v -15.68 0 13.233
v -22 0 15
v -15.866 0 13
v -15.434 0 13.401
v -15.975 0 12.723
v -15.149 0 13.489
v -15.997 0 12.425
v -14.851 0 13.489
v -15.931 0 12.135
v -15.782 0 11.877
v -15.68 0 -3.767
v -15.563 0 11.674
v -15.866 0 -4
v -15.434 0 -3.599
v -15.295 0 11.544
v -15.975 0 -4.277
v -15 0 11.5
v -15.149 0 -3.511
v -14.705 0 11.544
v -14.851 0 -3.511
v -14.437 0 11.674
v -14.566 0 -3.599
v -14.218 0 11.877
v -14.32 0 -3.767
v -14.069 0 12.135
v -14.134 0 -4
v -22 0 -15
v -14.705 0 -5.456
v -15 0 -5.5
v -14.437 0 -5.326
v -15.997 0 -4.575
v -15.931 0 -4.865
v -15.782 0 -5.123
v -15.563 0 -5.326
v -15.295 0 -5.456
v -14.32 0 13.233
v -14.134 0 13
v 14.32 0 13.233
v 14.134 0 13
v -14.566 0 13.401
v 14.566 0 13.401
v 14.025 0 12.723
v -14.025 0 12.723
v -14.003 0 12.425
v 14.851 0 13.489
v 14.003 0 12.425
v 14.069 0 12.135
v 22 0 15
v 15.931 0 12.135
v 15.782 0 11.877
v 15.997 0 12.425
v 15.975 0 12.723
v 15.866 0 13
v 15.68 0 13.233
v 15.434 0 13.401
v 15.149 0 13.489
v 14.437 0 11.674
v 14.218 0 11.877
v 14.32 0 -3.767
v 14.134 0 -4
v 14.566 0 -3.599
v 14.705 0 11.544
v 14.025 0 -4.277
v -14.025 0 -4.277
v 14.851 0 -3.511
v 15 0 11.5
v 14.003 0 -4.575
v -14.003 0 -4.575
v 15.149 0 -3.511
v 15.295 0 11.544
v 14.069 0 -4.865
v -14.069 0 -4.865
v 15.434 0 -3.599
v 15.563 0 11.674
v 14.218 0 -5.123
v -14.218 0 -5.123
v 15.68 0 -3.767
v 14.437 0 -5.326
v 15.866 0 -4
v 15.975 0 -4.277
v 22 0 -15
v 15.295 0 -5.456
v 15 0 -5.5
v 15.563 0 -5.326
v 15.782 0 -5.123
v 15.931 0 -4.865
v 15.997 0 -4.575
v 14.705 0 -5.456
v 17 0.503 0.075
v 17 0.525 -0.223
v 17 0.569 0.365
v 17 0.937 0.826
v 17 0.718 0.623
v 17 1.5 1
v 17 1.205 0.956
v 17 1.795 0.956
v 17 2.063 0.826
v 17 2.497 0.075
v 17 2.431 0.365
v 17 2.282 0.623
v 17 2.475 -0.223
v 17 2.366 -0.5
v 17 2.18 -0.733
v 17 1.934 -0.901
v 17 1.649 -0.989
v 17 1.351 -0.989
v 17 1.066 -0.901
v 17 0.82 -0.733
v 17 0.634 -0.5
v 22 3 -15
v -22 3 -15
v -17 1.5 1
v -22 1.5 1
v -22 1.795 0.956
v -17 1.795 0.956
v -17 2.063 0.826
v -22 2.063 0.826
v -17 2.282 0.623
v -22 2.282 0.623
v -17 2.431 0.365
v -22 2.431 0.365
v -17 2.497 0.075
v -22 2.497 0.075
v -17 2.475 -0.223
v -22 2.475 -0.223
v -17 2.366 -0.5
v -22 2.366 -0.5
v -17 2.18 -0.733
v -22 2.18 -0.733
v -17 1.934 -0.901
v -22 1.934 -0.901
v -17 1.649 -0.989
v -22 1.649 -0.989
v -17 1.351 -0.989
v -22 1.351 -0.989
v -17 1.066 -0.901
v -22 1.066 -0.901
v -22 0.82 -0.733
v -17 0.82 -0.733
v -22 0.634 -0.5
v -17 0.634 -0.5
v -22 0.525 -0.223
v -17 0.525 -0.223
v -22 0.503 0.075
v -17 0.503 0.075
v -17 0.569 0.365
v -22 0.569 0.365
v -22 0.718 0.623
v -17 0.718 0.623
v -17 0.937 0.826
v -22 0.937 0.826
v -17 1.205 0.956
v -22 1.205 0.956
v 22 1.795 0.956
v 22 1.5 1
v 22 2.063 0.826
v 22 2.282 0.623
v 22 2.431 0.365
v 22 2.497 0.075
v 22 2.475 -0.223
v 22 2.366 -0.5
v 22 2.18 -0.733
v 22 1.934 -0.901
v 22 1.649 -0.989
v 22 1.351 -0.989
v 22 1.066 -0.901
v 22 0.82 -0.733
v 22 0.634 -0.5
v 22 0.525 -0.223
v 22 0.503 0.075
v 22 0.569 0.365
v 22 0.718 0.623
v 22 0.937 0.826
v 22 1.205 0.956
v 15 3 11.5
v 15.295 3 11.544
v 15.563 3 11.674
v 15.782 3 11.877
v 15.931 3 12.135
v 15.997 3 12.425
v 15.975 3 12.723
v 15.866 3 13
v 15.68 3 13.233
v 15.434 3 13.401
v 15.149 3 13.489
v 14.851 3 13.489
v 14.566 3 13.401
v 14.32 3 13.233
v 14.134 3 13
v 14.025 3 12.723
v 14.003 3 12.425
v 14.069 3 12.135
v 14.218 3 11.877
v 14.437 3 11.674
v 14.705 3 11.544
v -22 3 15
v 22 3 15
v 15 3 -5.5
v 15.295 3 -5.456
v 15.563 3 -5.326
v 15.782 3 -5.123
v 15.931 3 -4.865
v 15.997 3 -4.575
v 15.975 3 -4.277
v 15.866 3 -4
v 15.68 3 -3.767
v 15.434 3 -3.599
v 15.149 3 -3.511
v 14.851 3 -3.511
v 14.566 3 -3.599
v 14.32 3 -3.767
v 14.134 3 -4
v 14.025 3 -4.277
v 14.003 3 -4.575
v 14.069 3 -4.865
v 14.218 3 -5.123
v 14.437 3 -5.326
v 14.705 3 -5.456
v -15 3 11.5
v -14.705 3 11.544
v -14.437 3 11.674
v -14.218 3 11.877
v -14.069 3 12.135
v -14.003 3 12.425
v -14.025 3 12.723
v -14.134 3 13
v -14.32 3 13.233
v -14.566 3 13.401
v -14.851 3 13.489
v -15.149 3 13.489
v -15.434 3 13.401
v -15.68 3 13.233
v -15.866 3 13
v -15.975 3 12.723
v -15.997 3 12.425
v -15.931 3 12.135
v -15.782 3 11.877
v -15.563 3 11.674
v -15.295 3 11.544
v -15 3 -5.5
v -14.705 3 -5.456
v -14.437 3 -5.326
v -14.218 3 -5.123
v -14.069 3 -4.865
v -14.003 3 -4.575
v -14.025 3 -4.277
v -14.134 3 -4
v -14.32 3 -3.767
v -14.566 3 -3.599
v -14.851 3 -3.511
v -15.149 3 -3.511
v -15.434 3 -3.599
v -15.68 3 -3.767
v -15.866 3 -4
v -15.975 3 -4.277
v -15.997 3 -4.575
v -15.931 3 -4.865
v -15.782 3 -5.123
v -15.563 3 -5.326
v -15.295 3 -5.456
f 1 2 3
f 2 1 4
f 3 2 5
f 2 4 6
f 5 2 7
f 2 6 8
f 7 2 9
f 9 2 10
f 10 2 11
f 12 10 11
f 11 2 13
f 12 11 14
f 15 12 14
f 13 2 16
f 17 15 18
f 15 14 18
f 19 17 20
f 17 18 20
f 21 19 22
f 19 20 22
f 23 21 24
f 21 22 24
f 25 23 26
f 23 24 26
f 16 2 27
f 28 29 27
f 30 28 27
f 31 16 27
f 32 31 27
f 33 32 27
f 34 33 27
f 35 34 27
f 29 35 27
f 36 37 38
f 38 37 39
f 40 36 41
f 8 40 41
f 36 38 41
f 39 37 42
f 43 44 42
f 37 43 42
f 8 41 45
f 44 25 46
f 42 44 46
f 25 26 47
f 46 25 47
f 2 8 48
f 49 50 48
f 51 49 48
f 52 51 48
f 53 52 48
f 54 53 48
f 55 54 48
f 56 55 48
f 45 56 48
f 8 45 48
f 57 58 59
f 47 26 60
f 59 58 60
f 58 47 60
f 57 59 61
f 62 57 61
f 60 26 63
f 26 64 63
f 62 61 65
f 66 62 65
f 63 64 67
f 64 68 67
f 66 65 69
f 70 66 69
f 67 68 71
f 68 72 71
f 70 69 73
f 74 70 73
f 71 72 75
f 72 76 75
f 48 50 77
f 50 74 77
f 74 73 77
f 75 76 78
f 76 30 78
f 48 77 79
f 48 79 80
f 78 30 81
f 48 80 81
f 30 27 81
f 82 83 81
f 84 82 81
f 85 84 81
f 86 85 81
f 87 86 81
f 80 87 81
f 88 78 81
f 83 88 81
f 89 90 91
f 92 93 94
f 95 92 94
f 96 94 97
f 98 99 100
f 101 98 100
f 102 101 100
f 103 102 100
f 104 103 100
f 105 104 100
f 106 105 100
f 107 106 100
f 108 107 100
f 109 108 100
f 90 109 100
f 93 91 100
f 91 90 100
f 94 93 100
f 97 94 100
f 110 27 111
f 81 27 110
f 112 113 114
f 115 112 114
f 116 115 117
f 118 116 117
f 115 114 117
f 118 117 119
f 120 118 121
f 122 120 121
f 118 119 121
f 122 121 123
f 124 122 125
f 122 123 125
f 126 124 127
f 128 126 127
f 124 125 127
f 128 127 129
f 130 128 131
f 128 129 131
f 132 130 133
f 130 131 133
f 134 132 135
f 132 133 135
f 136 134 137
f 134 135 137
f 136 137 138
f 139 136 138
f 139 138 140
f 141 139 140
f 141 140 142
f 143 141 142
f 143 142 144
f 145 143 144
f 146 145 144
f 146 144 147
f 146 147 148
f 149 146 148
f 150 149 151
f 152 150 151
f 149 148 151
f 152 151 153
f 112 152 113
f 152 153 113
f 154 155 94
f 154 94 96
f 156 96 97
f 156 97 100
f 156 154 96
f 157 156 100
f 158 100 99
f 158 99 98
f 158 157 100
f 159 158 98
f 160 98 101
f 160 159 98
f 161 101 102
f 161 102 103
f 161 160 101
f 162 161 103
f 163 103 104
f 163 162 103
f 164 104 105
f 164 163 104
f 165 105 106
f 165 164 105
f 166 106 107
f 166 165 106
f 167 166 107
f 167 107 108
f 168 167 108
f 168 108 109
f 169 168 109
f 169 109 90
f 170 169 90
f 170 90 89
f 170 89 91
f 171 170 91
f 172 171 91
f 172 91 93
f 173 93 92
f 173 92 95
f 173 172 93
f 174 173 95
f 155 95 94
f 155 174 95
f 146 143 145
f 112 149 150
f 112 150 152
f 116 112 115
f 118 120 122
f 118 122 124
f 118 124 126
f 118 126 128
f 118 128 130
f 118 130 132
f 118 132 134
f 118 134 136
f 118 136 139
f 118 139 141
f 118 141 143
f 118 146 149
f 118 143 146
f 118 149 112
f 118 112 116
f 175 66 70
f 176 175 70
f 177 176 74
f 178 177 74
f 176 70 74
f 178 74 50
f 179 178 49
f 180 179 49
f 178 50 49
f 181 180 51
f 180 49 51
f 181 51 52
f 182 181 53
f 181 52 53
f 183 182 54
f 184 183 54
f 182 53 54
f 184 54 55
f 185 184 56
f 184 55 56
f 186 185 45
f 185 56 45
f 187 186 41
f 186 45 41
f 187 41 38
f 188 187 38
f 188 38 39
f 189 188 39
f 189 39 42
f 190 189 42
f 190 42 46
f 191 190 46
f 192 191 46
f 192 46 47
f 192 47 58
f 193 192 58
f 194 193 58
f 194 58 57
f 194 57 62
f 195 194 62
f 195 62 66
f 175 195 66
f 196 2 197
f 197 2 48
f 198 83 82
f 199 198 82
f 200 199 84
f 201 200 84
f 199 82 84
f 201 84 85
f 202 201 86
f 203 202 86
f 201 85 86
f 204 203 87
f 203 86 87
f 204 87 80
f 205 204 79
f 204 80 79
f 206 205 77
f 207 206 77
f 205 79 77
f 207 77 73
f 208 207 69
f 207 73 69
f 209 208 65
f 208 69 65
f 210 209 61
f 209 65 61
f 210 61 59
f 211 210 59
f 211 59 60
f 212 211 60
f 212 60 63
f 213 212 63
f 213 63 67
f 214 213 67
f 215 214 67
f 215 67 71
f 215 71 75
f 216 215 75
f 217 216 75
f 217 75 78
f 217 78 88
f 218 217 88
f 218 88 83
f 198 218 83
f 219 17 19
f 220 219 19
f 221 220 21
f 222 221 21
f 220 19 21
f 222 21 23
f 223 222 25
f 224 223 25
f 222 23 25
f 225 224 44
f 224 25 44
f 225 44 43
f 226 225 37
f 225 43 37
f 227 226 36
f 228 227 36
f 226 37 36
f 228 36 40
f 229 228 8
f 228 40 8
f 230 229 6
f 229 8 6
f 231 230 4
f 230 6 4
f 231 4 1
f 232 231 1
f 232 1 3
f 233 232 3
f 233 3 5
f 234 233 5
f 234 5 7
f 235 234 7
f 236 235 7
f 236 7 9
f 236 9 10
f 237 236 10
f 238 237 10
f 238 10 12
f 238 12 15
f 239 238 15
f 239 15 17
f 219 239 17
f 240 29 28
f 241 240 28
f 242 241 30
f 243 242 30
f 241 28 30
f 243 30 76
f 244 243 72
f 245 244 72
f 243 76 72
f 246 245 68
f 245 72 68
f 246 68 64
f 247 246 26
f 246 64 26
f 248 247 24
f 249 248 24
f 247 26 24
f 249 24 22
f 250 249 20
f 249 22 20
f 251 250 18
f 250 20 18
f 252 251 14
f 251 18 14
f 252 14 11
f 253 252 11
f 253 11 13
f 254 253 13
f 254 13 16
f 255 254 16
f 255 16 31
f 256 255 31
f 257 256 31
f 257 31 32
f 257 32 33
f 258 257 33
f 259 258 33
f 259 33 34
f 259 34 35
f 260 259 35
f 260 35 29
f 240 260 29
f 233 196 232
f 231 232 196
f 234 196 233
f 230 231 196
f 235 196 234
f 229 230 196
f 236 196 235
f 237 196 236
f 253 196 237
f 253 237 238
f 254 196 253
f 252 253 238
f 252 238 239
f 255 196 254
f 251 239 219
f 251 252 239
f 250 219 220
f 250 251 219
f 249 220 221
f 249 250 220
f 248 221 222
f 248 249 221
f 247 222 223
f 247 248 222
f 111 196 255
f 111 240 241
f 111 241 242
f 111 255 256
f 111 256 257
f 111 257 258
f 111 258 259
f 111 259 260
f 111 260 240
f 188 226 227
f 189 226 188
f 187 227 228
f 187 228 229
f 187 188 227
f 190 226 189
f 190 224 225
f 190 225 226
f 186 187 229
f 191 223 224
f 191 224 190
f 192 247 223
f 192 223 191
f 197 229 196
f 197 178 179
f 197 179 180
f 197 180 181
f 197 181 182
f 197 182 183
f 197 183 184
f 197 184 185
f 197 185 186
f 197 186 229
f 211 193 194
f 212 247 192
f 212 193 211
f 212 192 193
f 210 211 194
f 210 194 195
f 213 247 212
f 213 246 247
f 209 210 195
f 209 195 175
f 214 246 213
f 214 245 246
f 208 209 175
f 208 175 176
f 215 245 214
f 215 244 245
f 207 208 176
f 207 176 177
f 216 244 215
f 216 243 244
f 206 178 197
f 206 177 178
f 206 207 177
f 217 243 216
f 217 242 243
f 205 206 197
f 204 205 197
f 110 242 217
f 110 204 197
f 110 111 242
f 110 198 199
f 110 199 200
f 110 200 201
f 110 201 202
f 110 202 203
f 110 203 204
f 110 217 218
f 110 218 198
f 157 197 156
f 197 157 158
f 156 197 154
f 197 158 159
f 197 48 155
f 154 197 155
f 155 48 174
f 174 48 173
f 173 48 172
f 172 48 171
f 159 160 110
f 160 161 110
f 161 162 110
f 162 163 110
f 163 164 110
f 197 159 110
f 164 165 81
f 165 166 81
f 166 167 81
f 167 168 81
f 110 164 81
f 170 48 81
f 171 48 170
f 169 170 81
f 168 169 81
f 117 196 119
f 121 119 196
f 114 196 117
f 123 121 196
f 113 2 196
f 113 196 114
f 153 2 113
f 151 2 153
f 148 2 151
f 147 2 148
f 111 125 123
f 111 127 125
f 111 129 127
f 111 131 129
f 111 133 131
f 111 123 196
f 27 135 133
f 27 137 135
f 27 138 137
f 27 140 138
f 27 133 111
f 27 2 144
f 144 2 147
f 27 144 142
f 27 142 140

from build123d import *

# Parameters (mm, degrees)
SKETCH1_W           = 44
SKETCH1_H           = 30
BOSS_EXTRUDE1_DEPTH = 3
SKETCH2_R           = 1
CUT_EXTRUDE1_DEPTH  = 5
SKETCH3_R           = 1
CUT_EXTRUDE2_DEPTH  = 5


with BuildPart() as part:
    # Sketch1 → Boss-Extrude1 (new body)
    with BuildSketch(Plane(origin=(0, 0, 0), x_dir=(1, 0, 0), z_dir=(0, 1, 0))):
        Rectangle(SKETCH1_W, SKETCH1_H)
    extrude(amount=BOSS_EXTRUDE1_DEPTH)

    # Sketch2 → Cut-Extrude1 (cut)
    with BuildSketch(Plane.ZY.offset(22)):
        with Locations((0, 1.5)):
            Circle(SKETCH2_R)
    cut_extrude1 = extrude(amount=-CUT_EXTRUDE1_DEPTH, mode=Mode.SUBTRACT)

    # Mirror1: Cut-Extrude1 across plane
    add(cut_extrude1.mirror(Plane(origin=(0, 0, 0), x_dir=(0, 0, 1), z_dir=(1, 0, 0))), mode=Mode.SUBTRACT)

    # Sketch3 → Cut-Extrude2 (cut)
    with BuildSketch(Plane(origin=(0, 0, 0), x_dir=(-1, 0, 0), z_dir=(0, -1, 0))):
        with Locations(Location((15, 4.5, 0), (0, 0, 90))):
            Circle(SKETCH3_R)
        with Locations(Location((15, -12.5, 0), (0, 0, 90))):
            Circle(SKETCH3_R)
        with Locations(Location((-15, -12.5, 0), (0, 0, 90))):
            Circle(SKETCH3_R)
        with Locations(Location((-15, 4.5, 0), (0, 0, 90))):
            Circle(SKETCH3_R)
    extrude(amount=-CUT_EXTRUDE2_DEPTH, mode=Mode.SUBTRACT)


solid = part.part
